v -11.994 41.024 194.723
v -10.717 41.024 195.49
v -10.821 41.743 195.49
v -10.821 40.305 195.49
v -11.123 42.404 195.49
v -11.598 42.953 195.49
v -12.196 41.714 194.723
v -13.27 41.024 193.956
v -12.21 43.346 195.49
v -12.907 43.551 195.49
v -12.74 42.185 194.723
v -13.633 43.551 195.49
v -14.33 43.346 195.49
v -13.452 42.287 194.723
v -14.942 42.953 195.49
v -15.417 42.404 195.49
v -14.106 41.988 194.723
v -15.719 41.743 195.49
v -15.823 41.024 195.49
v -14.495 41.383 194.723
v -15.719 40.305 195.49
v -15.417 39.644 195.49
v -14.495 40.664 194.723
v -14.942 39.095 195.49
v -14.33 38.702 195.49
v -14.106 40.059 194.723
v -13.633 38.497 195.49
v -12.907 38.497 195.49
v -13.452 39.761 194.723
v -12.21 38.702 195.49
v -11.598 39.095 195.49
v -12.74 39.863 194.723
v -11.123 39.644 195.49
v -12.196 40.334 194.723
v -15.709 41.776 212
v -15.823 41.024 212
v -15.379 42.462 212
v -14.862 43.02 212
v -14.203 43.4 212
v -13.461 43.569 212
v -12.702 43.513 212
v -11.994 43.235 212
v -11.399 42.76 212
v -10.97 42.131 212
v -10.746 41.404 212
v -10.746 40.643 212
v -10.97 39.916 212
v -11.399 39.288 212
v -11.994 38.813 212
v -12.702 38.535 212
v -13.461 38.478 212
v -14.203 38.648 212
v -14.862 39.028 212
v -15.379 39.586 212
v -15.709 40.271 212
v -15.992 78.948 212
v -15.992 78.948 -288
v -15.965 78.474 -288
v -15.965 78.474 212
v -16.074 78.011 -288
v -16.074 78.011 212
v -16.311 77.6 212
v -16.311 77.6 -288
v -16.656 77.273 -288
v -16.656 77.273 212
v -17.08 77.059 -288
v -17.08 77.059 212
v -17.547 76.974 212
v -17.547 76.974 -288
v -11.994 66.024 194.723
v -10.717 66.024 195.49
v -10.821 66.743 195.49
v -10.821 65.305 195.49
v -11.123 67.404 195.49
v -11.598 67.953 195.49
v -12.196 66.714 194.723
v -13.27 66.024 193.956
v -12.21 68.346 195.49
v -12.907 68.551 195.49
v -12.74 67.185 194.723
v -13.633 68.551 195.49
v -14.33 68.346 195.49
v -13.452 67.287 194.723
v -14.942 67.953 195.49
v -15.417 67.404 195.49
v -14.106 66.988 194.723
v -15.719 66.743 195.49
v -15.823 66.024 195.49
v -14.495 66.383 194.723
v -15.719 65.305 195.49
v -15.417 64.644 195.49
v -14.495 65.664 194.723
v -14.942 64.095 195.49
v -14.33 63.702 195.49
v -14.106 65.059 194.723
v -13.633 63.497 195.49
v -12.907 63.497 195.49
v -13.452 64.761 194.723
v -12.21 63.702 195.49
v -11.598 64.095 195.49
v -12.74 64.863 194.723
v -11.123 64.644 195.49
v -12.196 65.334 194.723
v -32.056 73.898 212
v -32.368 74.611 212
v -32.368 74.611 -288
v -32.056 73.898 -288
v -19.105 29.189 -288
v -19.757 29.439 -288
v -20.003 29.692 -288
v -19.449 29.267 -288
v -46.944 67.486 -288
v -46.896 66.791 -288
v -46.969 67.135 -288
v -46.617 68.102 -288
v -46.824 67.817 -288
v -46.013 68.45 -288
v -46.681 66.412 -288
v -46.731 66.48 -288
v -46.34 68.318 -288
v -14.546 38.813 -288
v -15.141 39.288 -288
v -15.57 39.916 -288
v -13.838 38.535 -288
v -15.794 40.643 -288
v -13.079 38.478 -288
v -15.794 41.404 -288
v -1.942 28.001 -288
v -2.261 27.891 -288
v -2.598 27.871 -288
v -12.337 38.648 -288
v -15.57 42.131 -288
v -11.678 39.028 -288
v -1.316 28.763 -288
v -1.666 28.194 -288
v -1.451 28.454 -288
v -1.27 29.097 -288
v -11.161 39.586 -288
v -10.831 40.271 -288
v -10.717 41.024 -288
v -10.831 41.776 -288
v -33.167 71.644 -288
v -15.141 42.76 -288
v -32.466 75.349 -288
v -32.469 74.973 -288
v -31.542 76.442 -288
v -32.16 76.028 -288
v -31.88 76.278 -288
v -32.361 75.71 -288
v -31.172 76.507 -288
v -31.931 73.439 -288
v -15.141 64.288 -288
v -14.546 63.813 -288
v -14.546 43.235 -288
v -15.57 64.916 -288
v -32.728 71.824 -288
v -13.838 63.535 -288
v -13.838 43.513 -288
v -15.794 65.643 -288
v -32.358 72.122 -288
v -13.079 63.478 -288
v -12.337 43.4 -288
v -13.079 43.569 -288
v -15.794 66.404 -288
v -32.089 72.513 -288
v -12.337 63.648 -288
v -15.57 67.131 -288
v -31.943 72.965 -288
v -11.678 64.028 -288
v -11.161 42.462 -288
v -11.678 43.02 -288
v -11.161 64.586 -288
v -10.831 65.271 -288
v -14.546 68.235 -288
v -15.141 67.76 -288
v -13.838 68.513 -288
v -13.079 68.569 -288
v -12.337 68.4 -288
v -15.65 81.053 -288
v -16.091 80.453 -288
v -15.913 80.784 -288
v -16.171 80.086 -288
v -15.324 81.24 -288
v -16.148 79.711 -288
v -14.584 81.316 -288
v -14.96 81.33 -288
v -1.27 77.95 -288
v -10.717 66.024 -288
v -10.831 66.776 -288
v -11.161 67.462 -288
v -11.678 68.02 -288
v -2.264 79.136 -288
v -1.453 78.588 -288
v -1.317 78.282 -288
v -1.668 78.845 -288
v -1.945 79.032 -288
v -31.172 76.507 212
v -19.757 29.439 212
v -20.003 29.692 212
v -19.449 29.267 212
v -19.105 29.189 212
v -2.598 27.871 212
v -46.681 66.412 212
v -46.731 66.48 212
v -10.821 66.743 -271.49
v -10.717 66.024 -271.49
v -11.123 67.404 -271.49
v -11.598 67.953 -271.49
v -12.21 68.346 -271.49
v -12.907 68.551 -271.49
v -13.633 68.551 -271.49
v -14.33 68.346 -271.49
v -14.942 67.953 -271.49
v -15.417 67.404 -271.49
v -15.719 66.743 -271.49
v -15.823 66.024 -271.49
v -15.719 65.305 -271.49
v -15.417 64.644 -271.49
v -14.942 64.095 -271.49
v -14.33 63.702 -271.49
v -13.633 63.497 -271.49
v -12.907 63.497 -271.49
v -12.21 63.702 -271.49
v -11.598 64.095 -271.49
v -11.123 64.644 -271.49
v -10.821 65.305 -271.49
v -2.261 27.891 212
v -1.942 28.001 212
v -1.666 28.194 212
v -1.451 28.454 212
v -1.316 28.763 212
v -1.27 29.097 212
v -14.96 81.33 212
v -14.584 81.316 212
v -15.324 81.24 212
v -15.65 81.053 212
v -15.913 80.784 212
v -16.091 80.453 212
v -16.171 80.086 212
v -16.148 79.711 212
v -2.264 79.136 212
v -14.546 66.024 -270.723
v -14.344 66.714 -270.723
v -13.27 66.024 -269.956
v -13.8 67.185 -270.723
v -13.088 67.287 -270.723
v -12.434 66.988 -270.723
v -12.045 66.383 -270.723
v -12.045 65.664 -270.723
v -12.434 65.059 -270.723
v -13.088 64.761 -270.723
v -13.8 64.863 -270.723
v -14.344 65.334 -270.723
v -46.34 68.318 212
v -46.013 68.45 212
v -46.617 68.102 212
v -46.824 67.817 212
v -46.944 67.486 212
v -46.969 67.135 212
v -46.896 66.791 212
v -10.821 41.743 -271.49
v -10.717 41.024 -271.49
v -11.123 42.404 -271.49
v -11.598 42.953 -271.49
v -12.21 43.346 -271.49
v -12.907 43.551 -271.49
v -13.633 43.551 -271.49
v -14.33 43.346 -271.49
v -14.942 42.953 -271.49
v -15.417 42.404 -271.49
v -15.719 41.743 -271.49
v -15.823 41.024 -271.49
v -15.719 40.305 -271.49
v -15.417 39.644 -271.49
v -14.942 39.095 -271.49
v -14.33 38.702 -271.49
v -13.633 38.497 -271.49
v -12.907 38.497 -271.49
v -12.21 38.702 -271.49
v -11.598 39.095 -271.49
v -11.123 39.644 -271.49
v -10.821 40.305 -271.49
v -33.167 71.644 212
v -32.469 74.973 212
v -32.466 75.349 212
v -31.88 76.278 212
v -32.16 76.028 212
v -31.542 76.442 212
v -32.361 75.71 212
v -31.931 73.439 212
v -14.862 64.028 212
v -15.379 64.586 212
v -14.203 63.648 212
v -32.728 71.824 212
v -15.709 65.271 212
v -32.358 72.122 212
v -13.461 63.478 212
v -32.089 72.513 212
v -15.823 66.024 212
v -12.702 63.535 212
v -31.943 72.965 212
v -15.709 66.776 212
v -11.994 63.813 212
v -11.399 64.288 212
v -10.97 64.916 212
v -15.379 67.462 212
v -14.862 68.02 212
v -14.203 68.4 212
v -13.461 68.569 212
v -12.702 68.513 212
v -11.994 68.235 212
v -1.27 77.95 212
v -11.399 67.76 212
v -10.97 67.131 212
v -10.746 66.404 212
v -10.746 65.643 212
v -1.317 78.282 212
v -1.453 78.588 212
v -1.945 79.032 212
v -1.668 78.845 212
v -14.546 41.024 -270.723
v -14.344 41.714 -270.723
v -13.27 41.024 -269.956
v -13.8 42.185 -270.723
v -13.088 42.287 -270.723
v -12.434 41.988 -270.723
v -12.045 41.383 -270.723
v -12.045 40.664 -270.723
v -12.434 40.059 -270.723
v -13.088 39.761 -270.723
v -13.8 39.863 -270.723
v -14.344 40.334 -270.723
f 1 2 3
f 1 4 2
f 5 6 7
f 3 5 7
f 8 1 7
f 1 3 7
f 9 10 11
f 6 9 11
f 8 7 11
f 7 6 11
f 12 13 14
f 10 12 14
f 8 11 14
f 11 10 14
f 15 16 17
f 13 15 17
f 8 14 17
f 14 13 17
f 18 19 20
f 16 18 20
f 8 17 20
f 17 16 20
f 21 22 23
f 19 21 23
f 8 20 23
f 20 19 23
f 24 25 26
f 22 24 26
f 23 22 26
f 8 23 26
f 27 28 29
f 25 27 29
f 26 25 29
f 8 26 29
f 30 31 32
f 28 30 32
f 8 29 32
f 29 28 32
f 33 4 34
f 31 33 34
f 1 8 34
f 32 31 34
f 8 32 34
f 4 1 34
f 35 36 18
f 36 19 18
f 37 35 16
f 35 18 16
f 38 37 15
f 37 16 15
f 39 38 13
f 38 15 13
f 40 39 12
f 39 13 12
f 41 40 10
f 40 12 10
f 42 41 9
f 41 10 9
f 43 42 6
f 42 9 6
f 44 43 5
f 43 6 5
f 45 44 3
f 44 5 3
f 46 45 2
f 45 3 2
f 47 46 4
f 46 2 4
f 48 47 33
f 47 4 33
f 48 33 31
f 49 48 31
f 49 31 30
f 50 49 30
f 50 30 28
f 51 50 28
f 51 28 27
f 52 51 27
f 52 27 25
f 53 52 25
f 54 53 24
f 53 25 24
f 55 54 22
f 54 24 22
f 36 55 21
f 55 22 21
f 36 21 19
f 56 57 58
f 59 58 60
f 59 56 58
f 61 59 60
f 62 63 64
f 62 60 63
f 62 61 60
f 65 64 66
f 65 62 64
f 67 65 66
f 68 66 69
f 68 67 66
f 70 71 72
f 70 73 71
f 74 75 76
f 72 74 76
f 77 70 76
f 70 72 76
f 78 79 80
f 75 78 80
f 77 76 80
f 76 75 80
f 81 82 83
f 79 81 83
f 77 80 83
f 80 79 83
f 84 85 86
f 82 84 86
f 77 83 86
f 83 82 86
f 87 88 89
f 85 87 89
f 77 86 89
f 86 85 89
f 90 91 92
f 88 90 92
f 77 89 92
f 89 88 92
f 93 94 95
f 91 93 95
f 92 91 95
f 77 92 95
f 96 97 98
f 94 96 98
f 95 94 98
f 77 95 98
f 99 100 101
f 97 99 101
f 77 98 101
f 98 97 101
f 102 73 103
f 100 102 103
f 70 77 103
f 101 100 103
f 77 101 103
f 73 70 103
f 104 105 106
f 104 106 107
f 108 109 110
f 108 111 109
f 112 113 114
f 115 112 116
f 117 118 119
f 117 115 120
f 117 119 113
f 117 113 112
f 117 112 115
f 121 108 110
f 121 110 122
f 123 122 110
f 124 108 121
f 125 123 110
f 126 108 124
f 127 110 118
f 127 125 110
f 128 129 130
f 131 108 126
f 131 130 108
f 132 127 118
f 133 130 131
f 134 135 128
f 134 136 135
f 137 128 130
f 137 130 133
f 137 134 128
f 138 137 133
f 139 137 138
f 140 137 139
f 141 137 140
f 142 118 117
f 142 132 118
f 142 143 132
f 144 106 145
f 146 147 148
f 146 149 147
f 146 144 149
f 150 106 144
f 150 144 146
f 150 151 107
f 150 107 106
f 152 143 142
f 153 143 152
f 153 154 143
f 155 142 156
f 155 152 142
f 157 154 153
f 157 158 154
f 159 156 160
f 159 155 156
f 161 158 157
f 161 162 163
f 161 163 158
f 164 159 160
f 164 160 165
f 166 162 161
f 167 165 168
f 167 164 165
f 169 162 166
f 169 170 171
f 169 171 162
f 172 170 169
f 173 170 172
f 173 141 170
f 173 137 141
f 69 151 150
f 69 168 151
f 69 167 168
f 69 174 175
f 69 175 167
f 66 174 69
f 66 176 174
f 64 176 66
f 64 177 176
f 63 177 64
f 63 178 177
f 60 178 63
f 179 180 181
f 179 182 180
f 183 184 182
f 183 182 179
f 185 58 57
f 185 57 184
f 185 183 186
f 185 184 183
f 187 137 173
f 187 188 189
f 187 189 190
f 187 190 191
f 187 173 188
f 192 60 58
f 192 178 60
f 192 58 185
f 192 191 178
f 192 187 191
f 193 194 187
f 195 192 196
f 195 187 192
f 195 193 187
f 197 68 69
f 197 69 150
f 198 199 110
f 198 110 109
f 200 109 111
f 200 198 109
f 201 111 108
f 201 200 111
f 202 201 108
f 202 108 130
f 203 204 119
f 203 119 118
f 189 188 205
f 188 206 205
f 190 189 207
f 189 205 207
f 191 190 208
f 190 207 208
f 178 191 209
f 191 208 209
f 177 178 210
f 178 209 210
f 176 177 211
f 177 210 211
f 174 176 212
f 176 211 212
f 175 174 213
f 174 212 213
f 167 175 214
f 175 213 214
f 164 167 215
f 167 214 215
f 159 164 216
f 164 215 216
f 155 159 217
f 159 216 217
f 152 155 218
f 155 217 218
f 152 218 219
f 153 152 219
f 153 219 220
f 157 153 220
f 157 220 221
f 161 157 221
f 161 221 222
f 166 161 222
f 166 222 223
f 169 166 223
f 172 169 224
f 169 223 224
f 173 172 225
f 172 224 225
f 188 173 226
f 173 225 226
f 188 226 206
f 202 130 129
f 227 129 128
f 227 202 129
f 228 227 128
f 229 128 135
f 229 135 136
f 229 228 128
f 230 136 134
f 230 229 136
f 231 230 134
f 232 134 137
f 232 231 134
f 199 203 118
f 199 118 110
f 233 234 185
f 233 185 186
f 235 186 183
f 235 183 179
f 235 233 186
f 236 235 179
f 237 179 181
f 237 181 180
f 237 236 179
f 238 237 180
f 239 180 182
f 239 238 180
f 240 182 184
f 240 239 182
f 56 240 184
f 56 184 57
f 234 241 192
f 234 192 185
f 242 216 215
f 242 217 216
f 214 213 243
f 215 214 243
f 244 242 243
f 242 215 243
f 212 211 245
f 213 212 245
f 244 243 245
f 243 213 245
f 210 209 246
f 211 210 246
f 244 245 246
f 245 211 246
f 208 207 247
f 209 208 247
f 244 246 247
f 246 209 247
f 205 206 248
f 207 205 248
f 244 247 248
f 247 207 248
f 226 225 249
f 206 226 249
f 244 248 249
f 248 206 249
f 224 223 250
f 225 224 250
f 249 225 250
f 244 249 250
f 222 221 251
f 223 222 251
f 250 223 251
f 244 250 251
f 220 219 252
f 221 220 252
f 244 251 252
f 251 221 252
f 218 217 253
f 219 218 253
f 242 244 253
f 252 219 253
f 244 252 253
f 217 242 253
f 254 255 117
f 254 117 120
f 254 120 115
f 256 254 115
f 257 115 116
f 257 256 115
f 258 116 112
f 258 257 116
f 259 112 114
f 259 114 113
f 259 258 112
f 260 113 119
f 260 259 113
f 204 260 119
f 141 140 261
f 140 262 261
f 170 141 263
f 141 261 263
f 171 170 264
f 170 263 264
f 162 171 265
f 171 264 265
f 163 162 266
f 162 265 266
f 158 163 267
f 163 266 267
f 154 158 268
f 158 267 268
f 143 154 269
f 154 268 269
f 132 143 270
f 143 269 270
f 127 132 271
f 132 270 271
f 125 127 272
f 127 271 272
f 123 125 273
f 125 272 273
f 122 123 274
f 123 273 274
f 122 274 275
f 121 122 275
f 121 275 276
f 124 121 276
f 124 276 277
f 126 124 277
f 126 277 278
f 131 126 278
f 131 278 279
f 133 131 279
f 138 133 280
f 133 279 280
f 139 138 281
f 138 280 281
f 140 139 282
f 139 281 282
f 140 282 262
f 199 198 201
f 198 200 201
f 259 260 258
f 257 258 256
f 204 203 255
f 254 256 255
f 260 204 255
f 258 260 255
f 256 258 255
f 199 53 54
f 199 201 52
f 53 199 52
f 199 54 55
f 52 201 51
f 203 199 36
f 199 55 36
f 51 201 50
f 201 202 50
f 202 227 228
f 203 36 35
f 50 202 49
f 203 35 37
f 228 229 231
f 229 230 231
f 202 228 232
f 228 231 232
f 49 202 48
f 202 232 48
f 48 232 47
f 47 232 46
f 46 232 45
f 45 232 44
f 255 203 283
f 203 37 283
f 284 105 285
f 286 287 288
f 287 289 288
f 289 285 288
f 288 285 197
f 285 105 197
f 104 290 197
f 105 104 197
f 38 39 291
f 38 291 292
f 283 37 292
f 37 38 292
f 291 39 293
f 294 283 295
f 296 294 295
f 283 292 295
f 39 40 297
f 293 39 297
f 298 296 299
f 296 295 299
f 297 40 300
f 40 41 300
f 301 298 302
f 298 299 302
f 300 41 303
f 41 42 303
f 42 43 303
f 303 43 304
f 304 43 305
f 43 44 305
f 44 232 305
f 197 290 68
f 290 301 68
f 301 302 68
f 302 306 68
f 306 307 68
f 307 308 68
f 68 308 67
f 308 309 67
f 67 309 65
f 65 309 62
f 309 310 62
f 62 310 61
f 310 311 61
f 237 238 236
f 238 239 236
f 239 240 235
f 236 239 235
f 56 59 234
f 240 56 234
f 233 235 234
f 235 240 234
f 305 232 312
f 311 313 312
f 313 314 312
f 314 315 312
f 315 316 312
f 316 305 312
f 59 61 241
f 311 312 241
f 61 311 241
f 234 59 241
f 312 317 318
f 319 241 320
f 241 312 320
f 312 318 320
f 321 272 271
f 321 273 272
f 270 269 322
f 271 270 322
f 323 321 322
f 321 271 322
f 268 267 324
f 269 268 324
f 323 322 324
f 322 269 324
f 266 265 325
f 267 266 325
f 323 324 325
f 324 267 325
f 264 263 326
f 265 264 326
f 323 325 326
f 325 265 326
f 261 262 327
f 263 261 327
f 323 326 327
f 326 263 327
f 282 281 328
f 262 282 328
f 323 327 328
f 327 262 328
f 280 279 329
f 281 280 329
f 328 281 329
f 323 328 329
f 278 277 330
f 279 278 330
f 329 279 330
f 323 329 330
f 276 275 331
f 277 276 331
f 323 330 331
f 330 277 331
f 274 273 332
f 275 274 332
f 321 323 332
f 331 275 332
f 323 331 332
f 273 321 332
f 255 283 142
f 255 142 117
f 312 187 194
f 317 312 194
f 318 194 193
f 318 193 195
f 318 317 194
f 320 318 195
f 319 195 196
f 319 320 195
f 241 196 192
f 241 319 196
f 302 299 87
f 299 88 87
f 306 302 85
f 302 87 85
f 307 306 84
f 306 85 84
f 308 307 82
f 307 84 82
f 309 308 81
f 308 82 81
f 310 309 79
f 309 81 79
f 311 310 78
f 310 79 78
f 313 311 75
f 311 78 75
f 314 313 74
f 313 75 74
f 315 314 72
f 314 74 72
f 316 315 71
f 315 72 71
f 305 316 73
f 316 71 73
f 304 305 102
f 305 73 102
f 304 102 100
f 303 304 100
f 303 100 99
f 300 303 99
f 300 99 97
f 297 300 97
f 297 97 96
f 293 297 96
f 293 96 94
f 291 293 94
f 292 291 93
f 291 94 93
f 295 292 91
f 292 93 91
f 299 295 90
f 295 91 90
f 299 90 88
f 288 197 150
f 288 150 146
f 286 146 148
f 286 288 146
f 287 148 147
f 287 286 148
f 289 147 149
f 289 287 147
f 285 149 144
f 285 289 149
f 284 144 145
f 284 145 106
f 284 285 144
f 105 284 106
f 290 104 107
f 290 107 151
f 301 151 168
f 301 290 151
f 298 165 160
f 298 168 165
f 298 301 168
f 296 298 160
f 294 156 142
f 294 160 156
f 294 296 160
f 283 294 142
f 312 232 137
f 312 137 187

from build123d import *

# Parameters (mm, degrees)
EXTRUDE_THIN1_DEPTH                   = 137.50025
EXTRUDE_THIN1_DEPTH_BACK              = 213.5
BOSS_EXTRUDE1_DEPTH                   = 212.50025
BOSS_EXTRUDE1_DEPTH_BACK              = 288.5
SKETCH3_OUTSIDE_W                     = 604.182
SKETCH3_OUTSIDE_H                     = 156.652
SKETCH3_OUTSIDE_W_2                   = 500
SKETCH3_OUTSIDE_H_2                   = 100
CUT_EXTRUDE1_DEPTH                    = 47.972186303
F_1_4_20_TAPPED_HOLE1_D               = 5.1054
F_1_4_20_TAPPED_HOLE1_DEPTH           = 16.51
F_1_4_20_TAPPED_HOLE1_TIP             = 1.533816902
F_1_4_20_TAPPED_HOLE1_ON_FACE_2_D     = 5.1054
F_1_4_20_TAPPED_HOLE1_ON_FACE_2_DEPTH = 16.51
F_1_4_20_TAPPED_HOLE1_ON_FACE_2_TIP   = 1.533816902


with BuildPart() as part:
    # Sketch1 → Extrude-Thin1 (new body, two sides)
    with BuildSketch(Plane.XY) as extrude_thin1_sk:
        with BuildLine():
            Line((-1, 29.097280522), (-1, 77.801426037))
            ThreePointArc((-1, 77.801426037), (-1.350622843, 78.7652373), (-2.238576202, 79.27846957))
            Line((-2.238576202, 79.27846957), (-14.558703222, 81.459024393))
            ThreePointArc((-14.558703222, 81.459024393), (-15.894736772, 81.028505528), (-16.289731153, 79.68154169))
            Line((-16.289731153, 79.68154169), (-16.133756175, 78.918587006))
            ThreePointArc((-16.133756175, 78.918587006), (-16.425245764, 77.689683446), (-17.55197675, 77.119028185))
            Line((-17.55197675, 77.119028185), (-31.176844121, 76.652024665))
            ThreePointArc((-31.176844121, 76.652024665), (-32.394172227, 75.953136676), (-32.500485503, 74.55348328))
            Line((-32.500485503, 74.55348328), (-32.189291755, 73.839630008))
            ThreePointArc((-32.189291755, 73.839630008), (-32.21890818, 72.576976846), (-33.20237149, 71.784531227))
            Line((-33.20237149, 71.784531227), (-46.048094305, 68.590520727))
            ThreePointArc((-46.048094305, 68.590520727), (-47.095522717, 67.648327863), (-46.899674591, 66.2531658))
            Line((-46.899674591, 66.2531658), (-20.221033316, 29.533166286))
            ThreePointArc((-20.221033316, 29.533166286), (-19.7411642, 29.106506164), (-19.126852316, 28.919599404))
            Line((-19.126852316, 28.919599404), (-2.619344492, 27.602035762))
            ThreePointArc((-2.619344492, 27.602035762), (-1.482408908, 27.995233168), (-1, 29.097280522))
        make_face()
        with BuildLine():
            Line((-1.27, 29.097280522), (-1.27, 77.801426037))
            ThreePointArc((-1.27, 77.801426037), (-1.557510731, 78.591751273), (-2.285632486, 79.012601734))
            Line((-2.285632486, 79.012601734), (-14.605759506, 81.193156557))
            ThreePointArc((-14.605759506, 81.193156557), (-15.701307017, 80.840131088), (-16.025202409, 79.735620741))
            Line((-16.025202409, 79.735620741), (-15.869227431, 78.972666057))
            ThreePointArc((-15.869227431, 78.972666057), (-16.213185147, 77.522559856), (-17.542727709, 76.849186648))
            Line((-17.542727709, 76.849186648), (-31.16759508, 76.382183127))
            ThreePointArc((-31.16759508, 76.382183127), (-32.165804128, 75.809094976), (-32.252981014, 74.661379192))
            Line((-32.252981014, 74.661379192), (-31.941787266, 73.94752592))
            ThreePointArc((-31.941787266, 73.94752592), (-31.976734648, 72.457595189), (-33.137221353, 71.522509358))
            Line((-33.137221353, 71.522509358), (-45.982944168, 68.328498858))
            ThreePointArc((-45.982944168, 68.328498858), (-46.841835466, 67.55590071), (-46.681240003, 66.411867819))
            Line((-46.681240003, 66.411867819), (-20.002598727, 29.691868304))
            ThreePointArc((-20.002598727, 29.691868304), (-19.609106053, 29.342007004), (-19.105370308, 29.188743461))
            Line((-19.105370308, 29.188743461), (-2.597862483, 27.871179818))
            ThreePointArc((-2.597862483, 27.871179818), (-1.665575304, 28.193601692), (-1.27, 29.097280522))
        make_face(mode=Mode.SUBTRACT)
    extrude(amount=EXTRUDE_THIN1_DEPTH)
    extrude(extrude_thin1_sk.sketch, amount=-EXTRUDE_THIN1_DEPTH_BACK)


with BuildPart() as body_2:
    # Sketch2 → Boss-Extrude1 (new body, two sides)
    with BuildSketch(Plane.XY) as boss_extrude1_sk:
        with BuildLine():
            Line((-46.68124, 66.411867814), (-20.002598727, 29.691868304))
            ThreePointArc((-20.002598727, 29.691868304), (-19.609106053, 29.342007004), (-19.105370308, 29.188743461))
            Line((-19.105370308, 29.188743461), (-2.597862483, 27.871179818))
            ThreePointArc((-2.597862483, 27.871179818), (-1.665575304, 28.193601692), (-1.27, 29.097280522))
            Line((-1.27, 29.097280522), (-1.27, 77.801426032))
            Line((-1.27, 77.801426032), (-1.27, 77.950492716))
            ThreePointArc((-1.27, 77.950492716), (-1.551343626, 78.723865476), (-2.263847169, 79.135688695))
            Line((-2.263847169, 79.135688695), (-14.583974189, 81.316243518))
            ThreePointArc((-14.583974189, 81.316243518), (-15.79085783, 80.927341477), (-16.14766942, 79.710584143))
            Line((-16.14766942, 79.710584143), (-15.991694442, 78.947629459))
            ThreePointArc((-15.991694442, 78.947629459), (-16.311361359, 77.599931889), (-17.547009673, 76.974113285))
            Line((-17.547009673, 76.974113285), (-31.171877043, 76.507109765))
            ThreePointArc((-31.171877043, 76.507109765), (-32.271530099, 75.875780948), (-32.367566426, 74.611427381))
            Line((-32.367566426, 74.611427381), (-32.056372677, 73.897574109))
            ThreePointArc((-32.056372677, 73.897574109), (-32.088852024, 72.512864474), (-33.167383454, 71.643815779))
            Line((-33.167383454, 71.643815779), (-46.013106268, 68.449805279))
            ThreePointArc((-46.013106268, 68.449805279), (-46.895812164, 67.655785195), (-46.730763849, 66.480031545))
            Line((-46.730763849, 66.480031545), (-46.68124, 66.411867814))
        make_face()
    extrude(amount=BOSS_EXTRUDE1_DEPTH)
    extrude(boss_extrude1_sk.sketch, amount=-BOSS_EXTRUDE1_DEPTH_BACK)

    # Sketch3 outside → Cut-Extrude1 (cut, through all)
    with BuildSketch(Plane(origin=(0, 0, 0), x_dir=(0, 0, -1), z_dir=(1, 0, 0))):
        with Locations((38, 54.602)):
            Rectangle(SKETCH3_OUTSIDE_W, SKETCH3_OUTSIDE_H)
        with Locations((37.999875, 53.523886616)):
            Rectangle(SKETCH3_OUTSIDE_W_2, SKETCH3_OUTSIDE_H_2, mode=Mode.SUBTRACT)
    extrude(amount=-CUT_EXTRUDE1_DEPTH, mode=Mode.SUBTRACT)

    # 1/4-20 Tapped Hole1
    with Locations(Plane(origin=(-13.27, 66.023886616, 212.000125), x_dir=(1, 0, 0), z_dir=(0, 0, 1))):
        with Locations((0, 0), (0, -25)):
            Hole(F_1_4_20_TAPPED_HOLE1_D / 2, depth=F_1_4_20_TAPPED_HOLE1_DEPTH)
            with Locations((0, 0, -(F_1_4_20_TAPPED_HOLE1_DEPTH + F_1_4_20_TAPPED_HOLE1_TIP / 2))):  # 118° drill point
                Cone(0, F_1_4_20_TAPPED_HOLE1_D / 2, F_1_4_20_TAPPED_HOLE1_TIP, mode=Mode.SUBTRACT)

    # 1/4-20 Tapped Hole1 on face 2
    with Locations(Plane(origin=(-13.27, 66.023886616, -287.999875), x_dir=(-1, 0, 0), z_dir=(0, 0, -1))):
        with Locations((0, 0), (0, -25)):
            Hole(F_1_4_20_TAPPED_HOLE1_ON_FACE_2_D / 2, depth=F_1_4_20_TAPPED_HOLE1_ON_FACE_2_DEPTH)
            with Locations((0, 0, -(F_1_4_20_TAPPED_HOLE1_ON_FACE_2_DEPTH + F_1_4_20_TAPPED_HOLE1_ON_FACE_2_TIP / 2))):  # 118° drill point
                Cone(0, F_1_4_20_TAPPED_HOLE1_ON_FACE_2_D / 2, F_1_4_20_TAPPED_HOLE1_ON_FACE_2_TIP, mode=Mode.SUBTRACT)


solid = body_2.part
